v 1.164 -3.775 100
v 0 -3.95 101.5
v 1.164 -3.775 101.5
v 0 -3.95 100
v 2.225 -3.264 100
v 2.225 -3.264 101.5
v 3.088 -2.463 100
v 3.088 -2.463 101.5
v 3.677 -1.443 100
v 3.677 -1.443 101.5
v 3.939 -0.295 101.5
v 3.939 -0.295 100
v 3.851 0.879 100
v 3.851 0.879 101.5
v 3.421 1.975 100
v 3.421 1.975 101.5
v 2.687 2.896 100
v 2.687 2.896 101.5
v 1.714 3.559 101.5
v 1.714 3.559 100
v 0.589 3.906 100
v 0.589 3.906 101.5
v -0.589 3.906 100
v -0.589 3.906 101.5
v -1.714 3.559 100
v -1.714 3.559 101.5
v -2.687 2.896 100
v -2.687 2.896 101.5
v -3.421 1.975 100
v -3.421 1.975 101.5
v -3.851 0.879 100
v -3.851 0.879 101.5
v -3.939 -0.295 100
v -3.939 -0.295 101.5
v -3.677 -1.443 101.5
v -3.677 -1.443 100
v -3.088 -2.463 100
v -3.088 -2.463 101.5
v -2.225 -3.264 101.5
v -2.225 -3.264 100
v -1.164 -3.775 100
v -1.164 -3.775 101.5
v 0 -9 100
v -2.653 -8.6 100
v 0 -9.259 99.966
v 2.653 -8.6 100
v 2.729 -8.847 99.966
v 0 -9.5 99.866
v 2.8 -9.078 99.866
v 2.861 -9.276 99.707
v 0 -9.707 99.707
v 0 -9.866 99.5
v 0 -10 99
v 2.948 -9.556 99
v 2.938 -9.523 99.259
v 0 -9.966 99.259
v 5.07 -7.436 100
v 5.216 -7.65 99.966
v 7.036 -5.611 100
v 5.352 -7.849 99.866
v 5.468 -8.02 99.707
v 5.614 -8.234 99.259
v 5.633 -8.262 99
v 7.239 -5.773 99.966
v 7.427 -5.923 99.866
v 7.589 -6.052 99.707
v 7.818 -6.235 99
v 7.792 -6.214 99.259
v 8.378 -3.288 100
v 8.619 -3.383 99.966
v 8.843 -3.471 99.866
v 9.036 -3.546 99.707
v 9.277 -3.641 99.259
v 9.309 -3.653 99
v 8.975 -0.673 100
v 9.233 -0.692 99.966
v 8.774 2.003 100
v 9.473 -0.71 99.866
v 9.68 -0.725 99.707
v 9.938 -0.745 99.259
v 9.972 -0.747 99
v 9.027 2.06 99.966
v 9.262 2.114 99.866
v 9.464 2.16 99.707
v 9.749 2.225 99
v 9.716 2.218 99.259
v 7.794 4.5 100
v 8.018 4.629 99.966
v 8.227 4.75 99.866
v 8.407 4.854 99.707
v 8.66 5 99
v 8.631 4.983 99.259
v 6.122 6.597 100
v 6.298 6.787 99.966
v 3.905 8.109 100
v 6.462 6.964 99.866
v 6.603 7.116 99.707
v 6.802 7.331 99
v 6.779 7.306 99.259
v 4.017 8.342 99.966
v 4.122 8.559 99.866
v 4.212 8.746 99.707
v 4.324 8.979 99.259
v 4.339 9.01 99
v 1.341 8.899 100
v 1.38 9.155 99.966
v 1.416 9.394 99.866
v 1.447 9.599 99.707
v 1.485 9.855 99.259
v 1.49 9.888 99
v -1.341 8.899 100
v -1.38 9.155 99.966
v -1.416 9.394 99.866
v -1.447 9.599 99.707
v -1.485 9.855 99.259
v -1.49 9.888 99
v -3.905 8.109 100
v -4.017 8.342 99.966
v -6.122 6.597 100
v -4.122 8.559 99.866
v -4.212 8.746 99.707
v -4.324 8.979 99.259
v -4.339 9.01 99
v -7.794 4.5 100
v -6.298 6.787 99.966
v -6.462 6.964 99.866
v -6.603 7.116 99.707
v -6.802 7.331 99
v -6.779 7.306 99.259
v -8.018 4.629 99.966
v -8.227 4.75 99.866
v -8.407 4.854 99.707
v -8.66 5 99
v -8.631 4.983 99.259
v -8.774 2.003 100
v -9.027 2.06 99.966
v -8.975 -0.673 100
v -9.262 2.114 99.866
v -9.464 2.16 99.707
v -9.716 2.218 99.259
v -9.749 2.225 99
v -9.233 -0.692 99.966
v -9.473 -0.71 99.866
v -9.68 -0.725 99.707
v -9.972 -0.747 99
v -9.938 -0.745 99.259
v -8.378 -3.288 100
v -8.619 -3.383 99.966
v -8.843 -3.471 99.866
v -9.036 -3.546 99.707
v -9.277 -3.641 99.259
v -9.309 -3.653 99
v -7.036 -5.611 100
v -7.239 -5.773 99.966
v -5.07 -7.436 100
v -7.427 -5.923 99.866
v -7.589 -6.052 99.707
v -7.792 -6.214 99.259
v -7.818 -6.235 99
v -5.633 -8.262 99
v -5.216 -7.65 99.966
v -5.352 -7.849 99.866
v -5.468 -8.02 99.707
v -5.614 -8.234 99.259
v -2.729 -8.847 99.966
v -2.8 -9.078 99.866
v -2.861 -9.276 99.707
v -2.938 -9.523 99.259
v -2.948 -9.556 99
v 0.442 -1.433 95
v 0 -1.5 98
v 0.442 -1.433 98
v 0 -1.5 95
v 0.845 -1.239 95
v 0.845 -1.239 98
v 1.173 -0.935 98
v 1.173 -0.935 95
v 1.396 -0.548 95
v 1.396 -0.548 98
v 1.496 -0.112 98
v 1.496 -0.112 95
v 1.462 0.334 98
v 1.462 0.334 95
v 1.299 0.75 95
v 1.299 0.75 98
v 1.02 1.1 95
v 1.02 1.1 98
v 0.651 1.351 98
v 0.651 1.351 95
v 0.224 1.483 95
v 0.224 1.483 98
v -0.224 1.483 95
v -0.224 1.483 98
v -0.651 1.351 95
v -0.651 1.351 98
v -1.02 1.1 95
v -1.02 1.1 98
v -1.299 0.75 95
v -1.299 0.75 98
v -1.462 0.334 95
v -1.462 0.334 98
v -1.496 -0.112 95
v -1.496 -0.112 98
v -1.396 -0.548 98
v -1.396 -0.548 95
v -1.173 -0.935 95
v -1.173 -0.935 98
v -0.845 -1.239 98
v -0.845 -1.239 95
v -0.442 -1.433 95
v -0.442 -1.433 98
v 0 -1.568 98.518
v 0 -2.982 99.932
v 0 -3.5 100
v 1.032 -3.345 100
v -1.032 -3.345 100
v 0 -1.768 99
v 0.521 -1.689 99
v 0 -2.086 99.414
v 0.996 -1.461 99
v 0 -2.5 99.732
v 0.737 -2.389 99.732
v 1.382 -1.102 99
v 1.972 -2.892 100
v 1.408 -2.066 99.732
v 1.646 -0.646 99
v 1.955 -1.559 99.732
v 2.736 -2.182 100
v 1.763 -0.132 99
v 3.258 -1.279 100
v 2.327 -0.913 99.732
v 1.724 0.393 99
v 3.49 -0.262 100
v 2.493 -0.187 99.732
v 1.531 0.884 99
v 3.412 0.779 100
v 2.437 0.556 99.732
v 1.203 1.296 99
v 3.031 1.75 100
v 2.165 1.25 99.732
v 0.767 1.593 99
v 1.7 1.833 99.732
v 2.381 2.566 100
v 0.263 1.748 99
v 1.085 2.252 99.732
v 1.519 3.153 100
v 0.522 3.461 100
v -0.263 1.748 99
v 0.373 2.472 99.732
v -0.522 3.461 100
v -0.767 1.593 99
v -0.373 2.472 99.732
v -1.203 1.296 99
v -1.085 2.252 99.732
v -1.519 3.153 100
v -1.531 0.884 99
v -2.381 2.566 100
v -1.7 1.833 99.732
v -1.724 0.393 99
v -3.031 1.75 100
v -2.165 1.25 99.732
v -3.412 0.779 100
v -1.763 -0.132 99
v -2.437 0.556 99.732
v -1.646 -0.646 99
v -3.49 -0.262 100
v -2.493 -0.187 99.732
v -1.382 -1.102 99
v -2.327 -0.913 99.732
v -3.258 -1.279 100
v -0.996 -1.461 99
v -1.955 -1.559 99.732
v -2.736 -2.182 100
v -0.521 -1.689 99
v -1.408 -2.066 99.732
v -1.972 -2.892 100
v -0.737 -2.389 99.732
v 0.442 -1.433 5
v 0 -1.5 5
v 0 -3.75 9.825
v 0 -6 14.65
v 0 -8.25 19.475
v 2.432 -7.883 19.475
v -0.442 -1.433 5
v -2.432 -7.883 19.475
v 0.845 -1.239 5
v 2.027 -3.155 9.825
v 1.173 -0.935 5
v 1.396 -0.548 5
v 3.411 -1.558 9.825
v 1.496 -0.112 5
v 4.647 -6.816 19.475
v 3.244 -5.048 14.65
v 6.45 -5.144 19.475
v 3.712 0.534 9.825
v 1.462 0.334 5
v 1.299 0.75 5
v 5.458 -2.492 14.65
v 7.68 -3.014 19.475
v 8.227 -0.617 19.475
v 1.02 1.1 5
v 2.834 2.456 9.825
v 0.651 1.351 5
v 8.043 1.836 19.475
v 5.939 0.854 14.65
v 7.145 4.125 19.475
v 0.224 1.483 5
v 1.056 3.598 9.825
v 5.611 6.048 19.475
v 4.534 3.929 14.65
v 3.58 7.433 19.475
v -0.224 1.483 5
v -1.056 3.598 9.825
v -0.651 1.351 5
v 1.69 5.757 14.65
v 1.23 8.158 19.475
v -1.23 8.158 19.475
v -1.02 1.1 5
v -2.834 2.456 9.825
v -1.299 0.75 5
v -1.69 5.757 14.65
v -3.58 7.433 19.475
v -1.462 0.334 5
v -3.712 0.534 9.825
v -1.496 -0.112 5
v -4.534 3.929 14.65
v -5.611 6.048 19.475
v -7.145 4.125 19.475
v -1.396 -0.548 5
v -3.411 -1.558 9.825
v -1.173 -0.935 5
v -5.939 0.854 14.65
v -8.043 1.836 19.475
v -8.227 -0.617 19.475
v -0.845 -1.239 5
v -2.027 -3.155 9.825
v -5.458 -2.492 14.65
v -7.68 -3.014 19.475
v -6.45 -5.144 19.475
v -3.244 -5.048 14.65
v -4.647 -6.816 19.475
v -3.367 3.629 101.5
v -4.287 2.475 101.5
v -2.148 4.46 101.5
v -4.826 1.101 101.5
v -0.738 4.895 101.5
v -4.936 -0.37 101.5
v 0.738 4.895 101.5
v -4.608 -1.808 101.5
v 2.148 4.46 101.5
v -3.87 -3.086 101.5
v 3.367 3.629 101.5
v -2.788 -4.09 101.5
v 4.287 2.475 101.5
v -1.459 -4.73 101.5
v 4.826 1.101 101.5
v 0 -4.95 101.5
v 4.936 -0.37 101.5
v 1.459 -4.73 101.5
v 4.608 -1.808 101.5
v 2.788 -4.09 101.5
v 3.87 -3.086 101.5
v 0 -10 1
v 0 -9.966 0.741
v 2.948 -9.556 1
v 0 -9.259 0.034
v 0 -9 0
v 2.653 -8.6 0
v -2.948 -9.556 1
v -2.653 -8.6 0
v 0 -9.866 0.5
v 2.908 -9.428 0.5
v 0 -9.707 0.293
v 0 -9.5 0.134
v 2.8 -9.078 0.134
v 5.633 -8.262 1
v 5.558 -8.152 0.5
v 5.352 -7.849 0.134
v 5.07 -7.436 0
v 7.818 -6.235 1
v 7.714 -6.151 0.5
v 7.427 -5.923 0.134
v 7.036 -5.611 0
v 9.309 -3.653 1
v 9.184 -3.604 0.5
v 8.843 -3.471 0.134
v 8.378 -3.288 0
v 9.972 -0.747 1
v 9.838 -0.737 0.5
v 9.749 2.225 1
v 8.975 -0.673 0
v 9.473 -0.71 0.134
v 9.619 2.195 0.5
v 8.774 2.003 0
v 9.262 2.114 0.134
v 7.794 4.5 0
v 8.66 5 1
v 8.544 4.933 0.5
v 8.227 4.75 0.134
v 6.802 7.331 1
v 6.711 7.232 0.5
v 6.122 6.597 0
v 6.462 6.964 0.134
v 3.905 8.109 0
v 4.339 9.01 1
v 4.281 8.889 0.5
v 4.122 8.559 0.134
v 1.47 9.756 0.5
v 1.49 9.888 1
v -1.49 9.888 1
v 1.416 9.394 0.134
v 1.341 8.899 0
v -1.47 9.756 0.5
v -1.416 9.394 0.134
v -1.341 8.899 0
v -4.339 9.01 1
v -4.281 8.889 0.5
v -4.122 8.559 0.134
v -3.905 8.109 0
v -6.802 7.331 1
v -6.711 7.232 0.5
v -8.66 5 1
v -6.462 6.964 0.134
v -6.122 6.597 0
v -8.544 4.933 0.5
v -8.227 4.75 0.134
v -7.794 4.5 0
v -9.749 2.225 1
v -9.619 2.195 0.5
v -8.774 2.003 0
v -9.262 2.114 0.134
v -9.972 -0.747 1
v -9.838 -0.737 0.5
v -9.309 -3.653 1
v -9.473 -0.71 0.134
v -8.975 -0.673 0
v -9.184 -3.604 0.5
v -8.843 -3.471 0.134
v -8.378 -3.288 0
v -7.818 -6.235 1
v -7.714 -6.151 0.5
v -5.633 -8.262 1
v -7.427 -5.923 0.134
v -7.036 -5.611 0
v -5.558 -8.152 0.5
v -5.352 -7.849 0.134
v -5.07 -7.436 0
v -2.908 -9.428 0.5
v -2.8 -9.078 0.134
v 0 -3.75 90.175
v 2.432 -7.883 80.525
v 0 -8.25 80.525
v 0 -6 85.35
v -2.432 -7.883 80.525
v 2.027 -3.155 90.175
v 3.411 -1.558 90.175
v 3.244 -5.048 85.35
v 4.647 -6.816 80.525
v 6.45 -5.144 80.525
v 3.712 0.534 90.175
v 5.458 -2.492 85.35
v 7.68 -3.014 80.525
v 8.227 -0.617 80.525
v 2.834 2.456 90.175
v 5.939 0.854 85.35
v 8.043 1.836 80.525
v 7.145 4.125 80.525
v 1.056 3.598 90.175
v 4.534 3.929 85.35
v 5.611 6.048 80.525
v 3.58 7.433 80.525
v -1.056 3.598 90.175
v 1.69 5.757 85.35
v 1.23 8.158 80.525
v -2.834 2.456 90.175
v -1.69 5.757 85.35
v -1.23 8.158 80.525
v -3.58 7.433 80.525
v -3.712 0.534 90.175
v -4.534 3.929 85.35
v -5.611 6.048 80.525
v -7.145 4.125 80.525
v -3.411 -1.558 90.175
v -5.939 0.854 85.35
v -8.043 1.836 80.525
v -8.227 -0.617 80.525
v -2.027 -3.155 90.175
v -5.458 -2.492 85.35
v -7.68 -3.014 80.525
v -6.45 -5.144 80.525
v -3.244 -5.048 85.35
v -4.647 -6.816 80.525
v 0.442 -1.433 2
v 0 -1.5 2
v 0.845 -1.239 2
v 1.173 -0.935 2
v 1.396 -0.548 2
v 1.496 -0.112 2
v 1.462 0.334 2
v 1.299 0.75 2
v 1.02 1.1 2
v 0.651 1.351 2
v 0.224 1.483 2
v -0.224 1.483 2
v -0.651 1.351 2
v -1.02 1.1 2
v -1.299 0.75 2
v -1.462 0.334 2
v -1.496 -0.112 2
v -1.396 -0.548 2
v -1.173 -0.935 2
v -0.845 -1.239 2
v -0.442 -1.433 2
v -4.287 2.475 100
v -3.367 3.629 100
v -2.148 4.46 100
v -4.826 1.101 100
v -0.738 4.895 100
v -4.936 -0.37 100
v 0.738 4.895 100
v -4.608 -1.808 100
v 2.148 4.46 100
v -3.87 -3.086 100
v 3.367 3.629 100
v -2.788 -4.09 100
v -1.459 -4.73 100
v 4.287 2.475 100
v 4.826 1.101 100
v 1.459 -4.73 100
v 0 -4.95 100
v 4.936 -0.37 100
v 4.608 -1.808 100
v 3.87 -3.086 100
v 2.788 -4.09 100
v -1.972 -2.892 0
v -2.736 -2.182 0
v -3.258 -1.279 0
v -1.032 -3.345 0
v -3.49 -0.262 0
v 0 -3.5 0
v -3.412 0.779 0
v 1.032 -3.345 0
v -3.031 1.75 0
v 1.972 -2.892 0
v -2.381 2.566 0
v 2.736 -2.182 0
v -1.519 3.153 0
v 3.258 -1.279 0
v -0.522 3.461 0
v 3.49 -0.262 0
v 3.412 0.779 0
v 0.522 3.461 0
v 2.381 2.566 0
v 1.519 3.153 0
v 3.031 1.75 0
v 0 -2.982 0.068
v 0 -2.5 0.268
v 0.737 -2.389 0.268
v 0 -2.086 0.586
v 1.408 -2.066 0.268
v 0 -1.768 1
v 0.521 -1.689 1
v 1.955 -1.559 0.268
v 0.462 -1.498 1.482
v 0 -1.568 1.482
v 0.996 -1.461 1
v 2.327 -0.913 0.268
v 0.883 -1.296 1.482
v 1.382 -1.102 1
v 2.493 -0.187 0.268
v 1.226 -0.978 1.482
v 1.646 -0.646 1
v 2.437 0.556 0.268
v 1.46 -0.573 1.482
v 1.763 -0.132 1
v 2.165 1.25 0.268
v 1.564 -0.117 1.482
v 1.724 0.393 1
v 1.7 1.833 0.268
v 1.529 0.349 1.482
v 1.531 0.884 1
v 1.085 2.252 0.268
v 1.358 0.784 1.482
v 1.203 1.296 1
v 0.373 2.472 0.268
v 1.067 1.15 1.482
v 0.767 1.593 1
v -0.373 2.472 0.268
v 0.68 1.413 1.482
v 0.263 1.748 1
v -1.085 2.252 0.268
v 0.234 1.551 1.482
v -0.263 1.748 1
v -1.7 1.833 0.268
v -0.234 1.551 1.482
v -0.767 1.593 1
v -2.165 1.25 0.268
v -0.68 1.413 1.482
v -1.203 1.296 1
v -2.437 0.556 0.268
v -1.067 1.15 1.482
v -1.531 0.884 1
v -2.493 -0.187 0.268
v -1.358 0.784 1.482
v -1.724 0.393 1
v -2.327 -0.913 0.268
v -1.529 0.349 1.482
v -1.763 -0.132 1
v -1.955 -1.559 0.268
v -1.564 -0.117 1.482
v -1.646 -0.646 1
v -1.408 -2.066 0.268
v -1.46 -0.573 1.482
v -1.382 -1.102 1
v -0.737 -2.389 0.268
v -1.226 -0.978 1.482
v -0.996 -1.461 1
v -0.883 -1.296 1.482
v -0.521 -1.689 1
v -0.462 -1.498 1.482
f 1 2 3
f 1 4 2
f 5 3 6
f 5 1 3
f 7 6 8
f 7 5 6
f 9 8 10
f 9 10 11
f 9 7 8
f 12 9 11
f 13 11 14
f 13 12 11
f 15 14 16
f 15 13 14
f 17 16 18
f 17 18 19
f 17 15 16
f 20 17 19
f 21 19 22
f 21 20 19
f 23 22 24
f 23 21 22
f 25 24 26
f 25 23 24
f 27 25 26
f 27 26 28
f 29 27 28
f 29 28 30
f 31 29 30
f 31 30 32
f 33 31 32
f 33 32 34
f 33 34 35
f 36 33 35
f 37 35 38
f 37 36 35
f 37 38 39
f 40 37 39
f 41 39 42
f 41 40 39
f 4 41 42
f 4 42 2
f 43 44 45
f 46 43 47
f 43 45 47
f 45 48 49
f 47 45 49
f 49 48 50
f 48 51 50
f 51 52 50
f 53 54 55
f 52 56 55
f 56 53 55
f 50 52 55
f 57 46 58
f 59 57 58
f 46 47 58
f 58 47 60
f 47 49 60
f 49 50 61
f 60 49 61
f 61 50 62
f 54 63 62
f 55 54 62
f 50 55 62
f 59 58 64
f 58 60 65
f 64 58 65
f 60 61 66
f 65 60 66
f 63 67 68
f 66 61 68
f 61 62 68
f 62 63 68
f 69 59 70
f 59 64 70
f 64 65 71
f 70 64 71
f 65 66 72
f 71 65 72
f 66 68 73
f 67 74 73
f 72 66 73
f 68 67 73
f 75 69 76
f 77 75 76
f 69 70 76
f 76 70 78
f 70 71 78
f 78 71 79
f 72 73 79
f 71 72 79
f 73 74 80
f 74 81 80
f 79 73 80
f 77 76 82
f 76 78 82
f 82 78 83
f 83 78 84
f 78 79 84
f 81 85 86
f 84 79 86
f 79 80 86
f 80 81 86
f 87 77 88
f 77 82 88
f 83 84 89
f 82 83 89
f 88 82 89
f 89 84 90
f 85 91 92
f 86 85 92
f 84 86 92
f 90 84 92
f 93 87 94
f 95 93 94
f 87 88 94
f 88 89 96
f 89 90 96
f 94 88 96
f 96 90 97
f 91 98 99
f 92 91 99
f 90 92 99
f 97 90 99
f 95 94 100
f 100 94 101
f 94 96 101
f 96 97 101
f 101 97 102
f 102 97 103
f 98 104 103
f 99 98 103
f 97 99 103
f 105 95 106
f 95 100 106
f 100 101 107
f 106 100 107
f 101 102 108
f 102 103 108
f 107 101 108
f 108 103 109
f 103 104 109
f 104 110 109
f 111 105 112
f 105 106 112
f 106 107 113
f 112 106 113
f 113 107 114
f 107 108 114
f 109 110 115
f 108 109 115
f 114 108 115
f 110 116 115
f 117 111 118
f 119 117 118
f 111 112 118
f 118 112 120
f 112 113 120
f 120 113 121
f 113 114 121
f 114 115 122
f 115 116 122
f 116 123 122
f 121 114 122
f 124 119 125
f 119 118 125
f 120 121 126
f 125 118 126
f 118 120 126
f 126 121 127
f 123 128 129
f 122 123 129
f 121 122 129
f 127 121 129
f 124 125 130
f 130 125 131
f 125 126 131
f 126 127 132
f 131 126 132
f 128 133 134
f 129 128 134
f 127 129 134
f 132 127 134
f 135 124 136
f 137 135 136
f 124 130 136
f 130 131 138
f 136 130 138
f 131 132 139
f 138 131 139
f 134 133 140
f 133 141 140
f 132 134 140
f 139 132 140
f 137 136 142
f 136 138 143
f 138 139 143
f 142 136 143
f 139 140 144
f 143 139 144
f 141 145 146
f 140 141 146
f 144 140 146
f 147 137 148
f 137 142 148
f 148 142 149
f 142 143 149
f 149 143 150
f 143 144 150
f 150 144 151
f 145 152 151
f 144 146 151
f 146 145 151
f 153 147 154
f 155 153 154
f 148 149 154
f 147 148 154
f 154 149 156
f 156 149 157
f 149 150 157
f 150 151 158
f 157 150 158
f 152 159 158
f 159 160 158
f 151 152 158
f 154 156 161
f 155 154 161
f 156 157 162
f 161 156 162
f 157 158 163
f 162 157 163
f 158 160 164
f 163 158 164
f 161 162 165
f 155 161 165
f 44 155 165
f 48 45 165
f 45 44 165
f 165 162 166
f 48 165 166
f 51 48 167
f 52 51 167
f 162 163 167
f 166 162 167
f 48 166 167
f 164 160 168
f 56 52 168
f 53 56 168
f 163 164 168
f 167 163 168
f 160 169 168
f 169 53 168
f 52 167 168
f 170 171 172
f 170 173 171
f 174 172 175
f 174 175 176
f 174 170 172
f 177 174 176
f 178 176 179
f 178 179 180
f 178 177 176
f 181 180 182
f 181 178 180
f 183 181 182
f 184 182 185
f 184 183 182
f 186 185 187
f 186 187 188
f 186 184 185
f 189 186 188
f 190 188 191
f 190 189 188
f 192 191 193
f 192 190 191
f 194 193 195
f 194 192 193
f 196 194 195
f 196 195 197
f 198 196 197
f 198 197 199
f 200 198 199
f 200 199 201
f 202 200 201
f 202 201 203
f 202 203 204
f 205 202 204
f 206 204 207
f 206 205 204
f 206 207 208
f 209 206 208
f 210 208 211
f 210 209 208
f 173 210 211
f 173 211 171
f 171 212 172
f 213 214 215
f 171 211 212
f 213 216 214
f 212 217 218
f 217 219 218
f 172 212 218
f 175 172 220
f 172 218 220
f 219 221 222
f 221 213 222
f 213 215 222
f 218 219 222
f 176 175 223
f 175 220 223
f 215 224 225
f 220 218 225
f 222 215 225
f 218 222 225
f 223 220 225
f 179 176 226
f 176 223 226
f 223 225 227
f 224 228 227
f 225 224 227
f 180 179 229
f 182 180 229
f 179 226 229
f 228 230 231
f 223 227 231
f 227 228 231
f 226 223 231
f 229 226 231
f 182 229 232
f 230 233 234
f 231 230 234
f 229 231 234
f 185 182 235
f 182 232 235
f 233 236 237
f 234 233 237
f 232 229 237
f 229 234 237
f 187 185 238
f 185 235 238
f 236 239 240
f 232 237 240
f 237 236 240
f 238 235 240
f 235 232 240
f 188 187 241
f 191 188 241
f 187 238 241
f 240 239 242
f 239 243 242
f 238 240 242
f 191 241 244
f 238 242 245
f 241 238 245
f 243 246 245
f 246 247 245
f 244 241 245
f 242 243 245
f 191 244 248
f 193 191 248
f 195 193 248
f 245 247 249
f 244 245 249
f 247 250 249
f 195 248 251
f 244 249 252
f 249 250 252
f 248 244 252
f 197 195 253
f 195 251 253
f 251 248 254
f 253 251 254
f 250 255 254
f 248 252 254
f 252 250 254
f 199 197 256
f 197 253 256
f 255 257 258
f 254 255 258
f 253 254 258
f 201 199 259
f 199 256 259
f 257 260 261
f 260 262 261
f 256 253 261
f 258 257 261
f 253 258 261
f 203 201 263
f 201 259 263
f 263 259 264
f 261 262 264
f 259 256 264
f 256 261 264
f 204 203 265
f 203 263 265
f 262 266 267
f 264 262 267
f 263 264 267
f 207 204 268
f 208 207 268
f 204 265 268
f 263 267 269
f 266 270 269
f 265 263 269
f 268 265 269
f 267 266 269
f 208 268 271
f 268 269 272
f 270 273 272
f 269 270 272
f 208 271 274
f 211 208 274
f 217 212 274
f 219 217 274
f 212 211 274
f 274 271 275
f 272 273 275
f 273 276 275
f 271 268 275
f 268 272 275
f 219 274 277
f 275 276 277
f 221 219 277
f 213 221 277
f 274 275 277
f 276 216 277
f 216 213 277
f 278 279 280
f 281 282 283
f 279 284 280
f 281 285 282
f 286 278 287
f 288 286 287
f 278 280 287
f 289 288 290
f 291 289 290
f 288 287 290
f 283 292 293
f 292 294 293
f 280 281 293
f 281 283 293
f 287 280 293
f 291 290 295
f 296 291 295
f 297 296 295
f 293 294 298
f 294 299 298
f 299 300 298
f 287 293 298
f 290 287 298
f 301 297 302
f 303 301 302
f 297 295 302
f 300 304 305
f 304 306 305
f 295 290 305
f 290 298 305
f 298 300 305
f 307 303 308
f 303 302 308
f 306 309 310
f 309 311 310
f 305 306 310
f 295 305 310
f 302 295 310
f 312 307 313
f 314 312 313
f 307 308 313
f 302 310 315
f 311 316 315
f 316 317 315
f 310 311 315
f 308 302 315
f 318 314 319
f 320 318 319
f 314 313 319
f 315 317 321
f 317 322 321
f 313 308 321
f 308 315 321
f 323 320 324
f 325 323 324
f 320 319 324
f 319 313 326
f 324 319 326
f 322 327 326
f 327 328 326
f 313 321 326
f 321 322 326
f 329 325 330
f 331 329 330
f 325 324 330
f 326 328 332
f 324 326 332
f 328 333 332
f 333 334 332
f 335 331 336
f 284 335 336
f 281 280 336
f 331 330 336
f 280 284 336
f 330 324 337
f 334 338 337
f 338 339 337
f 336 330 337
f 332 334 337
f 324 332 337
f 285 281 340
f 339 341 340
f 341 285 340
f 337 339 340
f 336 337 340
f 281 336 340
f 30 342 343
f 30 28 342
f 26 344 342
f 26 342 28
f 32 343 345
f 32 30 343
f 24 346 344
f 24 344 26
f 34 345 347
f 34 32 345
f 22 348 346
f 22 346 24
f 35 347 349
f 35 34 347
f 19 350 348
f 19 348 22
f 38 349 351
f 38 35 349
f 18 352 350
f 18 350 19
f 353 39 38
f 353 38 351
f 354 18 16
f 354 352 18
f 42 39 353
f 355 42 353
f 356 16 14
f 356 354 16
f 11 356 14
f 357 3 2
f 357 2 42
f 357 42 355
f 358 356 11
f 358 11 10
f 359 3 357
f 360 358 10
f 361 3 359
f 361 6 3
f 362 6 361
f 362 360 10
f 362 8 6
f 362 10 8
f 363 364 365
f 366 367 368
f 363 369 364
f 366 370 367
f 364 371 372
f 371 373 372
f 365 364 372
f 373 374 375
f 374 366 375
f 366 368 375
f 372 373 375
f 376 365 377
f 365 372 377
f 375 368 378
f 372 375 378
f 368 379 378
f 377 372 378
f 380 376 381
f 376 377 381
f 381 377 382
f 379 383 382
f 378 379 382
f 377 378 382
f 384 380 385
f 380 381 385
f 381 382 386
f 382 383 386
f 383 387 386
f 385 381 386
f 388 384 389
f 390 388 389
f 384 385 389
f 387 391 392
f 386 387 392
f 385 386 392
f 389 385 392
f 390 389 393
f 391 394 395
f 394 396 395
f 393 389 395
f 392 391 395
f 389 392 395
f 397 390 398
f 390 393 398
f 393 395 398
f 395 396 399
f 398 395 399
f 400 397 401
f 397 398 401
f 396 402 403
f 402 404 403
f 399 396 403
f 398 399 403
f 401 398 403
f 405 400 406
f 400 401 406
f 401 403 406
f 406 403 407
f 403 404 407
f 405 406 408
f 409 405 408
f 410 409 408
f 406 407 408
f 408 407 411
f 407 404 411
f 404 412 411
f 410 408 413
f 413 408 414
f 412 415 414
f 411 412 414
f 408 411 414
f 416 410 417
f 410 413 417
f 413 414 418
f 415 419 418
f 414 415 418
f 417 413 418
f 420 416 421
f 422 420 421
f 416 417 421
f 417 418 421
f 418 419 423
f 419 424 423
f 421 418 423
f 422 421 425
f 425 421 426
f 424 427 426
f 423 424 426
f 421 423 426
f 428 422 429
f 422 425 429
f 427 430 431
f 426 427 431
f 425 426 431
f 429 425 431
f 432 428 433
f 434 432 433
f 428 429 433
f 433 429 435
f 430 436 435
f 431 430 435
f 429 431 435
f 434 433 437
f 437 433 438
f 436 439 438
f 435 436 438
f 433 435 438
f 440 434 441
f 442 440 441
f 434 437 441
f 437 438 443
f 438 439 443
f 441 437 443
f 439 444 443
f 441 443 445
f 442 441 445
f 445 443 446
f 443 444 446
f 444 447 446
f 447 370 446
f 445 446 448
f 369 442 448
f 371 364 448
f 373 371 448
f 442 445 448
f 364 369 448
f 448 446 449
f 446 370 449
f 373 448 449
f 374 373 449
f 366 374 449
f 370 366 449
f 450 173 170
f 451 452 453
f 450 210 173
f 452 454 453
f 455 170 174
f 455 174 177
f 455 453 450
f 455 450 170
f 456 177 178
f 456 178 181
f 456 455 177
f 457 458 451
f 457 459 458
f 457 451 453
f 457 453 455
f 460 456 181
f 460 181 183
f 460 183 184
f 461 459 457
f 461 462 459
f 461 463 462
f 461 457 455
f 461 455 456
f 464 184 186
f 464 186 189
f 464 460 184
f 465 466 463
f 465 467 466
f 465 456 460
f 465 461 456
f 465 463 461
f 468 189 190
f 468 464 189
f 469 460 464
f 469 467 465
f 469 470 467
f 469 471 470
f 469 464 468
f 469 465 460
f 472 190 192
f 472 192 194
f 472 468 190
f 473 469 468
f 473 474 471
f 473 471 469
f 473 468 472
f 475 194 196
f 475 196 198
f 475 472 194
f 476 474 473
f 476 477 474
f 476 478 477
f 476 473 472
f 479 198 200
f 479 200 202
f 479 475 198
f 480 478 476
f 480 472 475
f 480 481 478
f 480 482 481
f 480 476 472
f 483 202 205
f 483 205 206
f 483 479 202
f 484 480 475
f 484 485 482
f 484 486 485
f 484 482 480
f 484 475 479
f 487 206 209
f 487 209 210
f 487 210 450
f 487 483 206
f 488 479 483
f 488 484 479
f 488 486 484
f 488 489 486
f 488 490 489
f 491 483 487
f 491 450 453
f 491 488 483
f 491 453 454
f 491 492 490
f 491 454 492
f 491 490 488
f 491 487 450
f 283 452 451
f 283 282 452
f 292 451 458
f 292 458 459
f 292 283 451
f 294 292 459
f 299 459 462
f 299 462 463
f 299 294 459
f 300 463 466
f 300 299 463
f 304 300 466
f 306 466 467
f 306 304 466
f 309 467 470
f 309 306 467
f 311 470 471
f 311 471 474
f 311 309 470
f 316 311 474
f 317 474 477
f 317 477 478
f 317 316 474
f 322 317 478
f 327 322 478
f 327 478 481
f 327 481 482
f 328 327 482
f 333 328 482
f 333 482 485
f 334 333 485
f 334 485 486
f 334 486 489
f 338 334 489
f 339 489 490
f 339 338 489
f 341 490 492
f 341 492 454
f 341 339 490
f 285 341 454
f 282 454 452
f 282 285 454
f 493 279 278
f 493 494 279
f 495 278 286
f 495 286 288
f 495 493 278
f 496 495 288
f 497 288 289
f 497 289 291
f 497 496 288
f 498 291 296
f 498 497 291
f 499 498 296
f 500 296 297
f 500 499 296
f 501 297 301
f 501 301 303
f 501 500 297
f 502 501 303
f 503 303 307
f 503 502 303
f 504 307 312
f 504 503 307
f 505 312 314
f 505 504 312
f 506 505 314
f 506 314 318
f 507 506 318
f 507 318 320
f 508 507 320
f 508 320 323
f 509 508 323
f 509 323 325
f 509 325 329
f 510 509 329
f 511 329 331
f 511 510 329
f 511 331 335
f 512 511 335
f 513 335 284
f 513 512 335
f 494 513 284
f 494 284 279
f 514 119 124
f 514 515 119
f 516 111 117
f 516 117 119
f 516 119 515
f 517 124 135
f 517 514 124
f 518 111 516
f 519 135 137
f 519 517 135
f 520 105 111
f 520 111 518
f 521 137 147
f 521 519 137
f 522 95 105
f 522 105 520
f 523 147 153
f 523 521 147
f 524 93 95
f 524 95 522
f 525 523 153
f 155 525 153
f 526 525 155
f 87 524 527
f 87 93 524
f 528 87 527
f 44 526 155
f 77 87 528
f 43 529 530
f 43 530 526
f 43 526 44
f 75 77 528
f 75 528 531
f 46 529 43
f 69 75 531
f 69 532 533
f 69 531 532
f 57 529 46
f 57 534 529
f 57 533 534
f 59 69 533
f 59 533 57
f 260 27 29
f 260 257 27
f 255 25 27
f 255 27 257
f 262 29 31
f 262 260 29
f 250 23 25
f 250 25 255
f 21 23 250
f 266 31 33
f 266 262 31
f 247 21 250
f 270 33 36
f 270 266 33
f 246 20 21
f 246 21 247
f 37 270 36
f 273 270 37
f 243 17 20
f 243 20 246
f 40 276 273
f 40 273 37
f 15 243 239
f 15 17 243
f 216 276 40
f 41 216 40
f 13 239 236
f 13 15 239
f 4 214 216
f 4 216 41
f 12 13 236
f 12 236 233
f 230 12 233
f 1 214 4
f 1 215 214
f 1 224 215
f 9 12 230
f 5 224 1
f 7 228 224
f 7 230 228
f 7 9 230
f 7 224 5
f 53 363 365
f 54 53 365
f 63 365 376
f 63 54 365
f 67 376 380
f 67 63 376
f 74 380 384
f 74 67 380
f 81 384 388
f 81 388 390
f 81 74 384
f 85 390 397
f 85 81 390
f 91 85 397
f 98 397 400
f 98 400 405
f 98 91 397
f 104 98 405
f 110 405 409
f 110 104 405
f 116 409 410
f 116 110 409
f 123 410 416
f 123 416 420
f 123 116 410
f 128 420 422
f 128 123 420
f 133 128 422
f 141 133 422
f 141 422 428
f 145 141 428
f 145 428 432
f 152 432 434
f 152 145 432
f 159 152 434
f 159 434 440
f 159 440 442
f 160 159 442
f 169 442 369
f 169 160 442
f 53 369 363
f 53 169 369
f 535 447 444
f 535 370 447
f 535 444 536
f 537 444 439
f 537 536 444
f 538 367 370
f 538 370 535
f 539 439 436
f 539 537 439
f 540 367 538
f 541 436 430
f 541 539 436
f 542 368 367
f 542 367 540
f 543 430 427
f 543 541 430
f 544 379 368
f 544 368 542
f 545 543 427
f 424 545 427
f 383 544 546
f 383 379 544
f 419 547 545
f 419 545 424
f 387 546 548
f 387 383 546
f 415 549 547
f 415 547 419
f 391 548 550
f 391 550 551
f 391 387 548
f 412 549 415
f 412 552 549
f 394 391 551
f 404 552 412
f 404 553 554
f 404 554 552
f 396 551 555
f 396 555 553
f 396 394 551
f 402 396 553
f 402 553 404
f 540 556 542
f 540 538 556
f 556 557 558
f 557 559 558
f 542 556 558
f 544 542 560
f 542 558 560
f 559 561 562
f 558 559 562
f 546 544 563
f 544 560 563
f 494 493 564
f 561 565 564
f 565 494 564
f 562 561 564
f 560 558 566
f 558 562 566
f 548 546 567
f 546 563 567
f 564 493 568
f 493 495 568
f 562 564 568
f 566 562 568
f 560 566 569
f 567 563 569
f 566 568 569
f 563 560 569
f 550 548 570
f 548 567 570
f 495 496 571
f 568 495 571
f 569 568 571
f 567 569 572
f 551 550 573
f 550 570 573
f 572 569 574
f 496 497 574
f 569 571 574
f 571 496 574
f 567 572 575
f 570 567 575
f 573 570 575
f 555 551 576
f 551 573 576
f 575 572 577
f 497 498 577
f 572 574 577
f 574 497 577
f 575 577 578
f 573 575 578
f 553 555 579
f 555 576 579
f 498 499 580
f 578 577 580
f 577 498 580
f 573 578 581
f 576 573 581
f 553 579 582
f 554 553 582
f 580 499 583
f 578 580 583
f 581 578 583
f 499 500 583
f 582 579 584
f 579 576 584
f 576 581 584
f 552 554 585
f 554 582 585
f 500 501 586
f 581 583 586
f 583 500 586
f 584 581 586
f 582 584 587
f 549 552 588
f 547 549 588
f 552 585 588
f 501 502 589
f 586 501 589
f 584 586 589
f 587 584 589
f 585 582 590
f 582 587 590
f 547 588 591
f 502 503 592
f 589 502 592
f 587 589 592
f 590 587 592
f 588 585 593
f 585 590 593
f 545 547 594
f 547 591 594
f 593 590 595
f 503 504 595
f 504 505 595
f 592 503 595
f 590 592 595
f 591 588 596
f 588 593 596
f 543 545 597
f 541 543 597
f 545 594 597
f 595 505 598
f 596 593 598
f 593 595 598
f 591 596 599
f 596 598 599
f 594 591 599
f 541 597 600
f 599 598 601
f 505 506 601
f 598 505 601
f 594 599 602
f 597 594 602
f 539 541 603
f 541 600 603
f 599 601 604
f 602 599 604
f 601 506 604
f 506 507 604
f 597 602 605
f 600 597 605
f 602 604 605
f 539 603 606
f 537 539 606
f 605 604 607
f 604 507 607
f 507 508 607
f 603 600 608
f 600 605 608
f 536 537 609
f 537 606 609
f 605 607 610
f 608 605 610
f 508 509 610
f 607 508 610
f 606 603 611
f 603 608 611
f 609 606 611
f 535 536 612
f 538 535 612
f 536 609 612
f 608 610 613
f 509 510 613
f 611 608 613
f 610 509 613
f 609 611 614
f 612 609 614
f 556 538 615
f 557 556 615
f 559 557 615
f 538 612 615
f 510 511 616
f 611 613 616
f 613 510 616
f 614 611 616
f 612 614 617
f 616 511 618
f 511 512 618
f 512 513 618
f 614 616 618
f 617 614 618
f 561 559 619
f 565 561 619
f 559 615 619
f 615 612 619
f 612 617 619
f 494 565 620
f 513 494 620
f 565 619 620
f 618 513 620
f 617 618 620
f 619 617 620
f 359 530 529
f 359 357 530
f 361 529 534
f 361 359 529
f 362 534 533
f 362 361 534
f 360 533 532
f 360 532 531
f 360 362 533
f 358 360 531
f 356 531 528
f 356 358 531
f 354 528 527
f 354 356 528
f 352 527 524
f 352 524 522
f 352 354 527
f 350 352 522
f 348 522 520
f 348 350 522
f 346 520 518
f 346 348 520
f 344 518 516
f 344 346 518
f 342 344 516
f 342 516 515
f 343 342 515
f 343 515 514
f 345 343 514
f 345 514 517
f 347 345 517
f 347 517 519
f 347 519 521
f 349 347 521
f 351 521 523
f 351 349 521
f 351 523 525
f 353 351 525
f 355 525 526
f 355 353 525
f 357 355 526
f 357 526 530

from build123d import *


with BuildPart() as part:
    # Sketch → Revolution (revolve)
    with BuildSketch(Plane.YZ):
        with BuildLine():
            Line((-1.5, 5), (-1.5, 2))
            ThreePointArc((-3.5, 0), (-2.085786, 0.585786), (-1.5, 2))
            Line((-3.5, 0), (-9, 0))
            ThreePointArc((-10, 1), (-9.707107, 0.292893), (-9, 0))
            Line((-10, 1), (-10, 99))
            ThreePointArc((-9, 100), (-9.707107, 99.707107), (-10, 99))
            Line((-9, 100), (-4.95, 100))
            Line((-4.95, 100), (-4.95, 101.5))
            Line((-4.95, 101.5), (-3.95, 101.5))
            Line((-3.95, 101.5), (-3.95, 100))
            Line((-3.95, 100), (-3.499999, 100))
            ThreePointArc((-1.5, 98), (-2.085786, 99.414213), (-3.499999, 100))
            Line((-1.5, 98), (-1.5, 95))
            Line((-1.5, 95), (-8.25, 80.524578))
            Line((-8.25, 80.524578), (-8.25, 19.475422))
            Line((-1.5, 5), (-8.25, 19.475422))
        make_face()
    revolve(axis=Axis((0, 0, 0), (0, 0, 1)))


solid = part.part
